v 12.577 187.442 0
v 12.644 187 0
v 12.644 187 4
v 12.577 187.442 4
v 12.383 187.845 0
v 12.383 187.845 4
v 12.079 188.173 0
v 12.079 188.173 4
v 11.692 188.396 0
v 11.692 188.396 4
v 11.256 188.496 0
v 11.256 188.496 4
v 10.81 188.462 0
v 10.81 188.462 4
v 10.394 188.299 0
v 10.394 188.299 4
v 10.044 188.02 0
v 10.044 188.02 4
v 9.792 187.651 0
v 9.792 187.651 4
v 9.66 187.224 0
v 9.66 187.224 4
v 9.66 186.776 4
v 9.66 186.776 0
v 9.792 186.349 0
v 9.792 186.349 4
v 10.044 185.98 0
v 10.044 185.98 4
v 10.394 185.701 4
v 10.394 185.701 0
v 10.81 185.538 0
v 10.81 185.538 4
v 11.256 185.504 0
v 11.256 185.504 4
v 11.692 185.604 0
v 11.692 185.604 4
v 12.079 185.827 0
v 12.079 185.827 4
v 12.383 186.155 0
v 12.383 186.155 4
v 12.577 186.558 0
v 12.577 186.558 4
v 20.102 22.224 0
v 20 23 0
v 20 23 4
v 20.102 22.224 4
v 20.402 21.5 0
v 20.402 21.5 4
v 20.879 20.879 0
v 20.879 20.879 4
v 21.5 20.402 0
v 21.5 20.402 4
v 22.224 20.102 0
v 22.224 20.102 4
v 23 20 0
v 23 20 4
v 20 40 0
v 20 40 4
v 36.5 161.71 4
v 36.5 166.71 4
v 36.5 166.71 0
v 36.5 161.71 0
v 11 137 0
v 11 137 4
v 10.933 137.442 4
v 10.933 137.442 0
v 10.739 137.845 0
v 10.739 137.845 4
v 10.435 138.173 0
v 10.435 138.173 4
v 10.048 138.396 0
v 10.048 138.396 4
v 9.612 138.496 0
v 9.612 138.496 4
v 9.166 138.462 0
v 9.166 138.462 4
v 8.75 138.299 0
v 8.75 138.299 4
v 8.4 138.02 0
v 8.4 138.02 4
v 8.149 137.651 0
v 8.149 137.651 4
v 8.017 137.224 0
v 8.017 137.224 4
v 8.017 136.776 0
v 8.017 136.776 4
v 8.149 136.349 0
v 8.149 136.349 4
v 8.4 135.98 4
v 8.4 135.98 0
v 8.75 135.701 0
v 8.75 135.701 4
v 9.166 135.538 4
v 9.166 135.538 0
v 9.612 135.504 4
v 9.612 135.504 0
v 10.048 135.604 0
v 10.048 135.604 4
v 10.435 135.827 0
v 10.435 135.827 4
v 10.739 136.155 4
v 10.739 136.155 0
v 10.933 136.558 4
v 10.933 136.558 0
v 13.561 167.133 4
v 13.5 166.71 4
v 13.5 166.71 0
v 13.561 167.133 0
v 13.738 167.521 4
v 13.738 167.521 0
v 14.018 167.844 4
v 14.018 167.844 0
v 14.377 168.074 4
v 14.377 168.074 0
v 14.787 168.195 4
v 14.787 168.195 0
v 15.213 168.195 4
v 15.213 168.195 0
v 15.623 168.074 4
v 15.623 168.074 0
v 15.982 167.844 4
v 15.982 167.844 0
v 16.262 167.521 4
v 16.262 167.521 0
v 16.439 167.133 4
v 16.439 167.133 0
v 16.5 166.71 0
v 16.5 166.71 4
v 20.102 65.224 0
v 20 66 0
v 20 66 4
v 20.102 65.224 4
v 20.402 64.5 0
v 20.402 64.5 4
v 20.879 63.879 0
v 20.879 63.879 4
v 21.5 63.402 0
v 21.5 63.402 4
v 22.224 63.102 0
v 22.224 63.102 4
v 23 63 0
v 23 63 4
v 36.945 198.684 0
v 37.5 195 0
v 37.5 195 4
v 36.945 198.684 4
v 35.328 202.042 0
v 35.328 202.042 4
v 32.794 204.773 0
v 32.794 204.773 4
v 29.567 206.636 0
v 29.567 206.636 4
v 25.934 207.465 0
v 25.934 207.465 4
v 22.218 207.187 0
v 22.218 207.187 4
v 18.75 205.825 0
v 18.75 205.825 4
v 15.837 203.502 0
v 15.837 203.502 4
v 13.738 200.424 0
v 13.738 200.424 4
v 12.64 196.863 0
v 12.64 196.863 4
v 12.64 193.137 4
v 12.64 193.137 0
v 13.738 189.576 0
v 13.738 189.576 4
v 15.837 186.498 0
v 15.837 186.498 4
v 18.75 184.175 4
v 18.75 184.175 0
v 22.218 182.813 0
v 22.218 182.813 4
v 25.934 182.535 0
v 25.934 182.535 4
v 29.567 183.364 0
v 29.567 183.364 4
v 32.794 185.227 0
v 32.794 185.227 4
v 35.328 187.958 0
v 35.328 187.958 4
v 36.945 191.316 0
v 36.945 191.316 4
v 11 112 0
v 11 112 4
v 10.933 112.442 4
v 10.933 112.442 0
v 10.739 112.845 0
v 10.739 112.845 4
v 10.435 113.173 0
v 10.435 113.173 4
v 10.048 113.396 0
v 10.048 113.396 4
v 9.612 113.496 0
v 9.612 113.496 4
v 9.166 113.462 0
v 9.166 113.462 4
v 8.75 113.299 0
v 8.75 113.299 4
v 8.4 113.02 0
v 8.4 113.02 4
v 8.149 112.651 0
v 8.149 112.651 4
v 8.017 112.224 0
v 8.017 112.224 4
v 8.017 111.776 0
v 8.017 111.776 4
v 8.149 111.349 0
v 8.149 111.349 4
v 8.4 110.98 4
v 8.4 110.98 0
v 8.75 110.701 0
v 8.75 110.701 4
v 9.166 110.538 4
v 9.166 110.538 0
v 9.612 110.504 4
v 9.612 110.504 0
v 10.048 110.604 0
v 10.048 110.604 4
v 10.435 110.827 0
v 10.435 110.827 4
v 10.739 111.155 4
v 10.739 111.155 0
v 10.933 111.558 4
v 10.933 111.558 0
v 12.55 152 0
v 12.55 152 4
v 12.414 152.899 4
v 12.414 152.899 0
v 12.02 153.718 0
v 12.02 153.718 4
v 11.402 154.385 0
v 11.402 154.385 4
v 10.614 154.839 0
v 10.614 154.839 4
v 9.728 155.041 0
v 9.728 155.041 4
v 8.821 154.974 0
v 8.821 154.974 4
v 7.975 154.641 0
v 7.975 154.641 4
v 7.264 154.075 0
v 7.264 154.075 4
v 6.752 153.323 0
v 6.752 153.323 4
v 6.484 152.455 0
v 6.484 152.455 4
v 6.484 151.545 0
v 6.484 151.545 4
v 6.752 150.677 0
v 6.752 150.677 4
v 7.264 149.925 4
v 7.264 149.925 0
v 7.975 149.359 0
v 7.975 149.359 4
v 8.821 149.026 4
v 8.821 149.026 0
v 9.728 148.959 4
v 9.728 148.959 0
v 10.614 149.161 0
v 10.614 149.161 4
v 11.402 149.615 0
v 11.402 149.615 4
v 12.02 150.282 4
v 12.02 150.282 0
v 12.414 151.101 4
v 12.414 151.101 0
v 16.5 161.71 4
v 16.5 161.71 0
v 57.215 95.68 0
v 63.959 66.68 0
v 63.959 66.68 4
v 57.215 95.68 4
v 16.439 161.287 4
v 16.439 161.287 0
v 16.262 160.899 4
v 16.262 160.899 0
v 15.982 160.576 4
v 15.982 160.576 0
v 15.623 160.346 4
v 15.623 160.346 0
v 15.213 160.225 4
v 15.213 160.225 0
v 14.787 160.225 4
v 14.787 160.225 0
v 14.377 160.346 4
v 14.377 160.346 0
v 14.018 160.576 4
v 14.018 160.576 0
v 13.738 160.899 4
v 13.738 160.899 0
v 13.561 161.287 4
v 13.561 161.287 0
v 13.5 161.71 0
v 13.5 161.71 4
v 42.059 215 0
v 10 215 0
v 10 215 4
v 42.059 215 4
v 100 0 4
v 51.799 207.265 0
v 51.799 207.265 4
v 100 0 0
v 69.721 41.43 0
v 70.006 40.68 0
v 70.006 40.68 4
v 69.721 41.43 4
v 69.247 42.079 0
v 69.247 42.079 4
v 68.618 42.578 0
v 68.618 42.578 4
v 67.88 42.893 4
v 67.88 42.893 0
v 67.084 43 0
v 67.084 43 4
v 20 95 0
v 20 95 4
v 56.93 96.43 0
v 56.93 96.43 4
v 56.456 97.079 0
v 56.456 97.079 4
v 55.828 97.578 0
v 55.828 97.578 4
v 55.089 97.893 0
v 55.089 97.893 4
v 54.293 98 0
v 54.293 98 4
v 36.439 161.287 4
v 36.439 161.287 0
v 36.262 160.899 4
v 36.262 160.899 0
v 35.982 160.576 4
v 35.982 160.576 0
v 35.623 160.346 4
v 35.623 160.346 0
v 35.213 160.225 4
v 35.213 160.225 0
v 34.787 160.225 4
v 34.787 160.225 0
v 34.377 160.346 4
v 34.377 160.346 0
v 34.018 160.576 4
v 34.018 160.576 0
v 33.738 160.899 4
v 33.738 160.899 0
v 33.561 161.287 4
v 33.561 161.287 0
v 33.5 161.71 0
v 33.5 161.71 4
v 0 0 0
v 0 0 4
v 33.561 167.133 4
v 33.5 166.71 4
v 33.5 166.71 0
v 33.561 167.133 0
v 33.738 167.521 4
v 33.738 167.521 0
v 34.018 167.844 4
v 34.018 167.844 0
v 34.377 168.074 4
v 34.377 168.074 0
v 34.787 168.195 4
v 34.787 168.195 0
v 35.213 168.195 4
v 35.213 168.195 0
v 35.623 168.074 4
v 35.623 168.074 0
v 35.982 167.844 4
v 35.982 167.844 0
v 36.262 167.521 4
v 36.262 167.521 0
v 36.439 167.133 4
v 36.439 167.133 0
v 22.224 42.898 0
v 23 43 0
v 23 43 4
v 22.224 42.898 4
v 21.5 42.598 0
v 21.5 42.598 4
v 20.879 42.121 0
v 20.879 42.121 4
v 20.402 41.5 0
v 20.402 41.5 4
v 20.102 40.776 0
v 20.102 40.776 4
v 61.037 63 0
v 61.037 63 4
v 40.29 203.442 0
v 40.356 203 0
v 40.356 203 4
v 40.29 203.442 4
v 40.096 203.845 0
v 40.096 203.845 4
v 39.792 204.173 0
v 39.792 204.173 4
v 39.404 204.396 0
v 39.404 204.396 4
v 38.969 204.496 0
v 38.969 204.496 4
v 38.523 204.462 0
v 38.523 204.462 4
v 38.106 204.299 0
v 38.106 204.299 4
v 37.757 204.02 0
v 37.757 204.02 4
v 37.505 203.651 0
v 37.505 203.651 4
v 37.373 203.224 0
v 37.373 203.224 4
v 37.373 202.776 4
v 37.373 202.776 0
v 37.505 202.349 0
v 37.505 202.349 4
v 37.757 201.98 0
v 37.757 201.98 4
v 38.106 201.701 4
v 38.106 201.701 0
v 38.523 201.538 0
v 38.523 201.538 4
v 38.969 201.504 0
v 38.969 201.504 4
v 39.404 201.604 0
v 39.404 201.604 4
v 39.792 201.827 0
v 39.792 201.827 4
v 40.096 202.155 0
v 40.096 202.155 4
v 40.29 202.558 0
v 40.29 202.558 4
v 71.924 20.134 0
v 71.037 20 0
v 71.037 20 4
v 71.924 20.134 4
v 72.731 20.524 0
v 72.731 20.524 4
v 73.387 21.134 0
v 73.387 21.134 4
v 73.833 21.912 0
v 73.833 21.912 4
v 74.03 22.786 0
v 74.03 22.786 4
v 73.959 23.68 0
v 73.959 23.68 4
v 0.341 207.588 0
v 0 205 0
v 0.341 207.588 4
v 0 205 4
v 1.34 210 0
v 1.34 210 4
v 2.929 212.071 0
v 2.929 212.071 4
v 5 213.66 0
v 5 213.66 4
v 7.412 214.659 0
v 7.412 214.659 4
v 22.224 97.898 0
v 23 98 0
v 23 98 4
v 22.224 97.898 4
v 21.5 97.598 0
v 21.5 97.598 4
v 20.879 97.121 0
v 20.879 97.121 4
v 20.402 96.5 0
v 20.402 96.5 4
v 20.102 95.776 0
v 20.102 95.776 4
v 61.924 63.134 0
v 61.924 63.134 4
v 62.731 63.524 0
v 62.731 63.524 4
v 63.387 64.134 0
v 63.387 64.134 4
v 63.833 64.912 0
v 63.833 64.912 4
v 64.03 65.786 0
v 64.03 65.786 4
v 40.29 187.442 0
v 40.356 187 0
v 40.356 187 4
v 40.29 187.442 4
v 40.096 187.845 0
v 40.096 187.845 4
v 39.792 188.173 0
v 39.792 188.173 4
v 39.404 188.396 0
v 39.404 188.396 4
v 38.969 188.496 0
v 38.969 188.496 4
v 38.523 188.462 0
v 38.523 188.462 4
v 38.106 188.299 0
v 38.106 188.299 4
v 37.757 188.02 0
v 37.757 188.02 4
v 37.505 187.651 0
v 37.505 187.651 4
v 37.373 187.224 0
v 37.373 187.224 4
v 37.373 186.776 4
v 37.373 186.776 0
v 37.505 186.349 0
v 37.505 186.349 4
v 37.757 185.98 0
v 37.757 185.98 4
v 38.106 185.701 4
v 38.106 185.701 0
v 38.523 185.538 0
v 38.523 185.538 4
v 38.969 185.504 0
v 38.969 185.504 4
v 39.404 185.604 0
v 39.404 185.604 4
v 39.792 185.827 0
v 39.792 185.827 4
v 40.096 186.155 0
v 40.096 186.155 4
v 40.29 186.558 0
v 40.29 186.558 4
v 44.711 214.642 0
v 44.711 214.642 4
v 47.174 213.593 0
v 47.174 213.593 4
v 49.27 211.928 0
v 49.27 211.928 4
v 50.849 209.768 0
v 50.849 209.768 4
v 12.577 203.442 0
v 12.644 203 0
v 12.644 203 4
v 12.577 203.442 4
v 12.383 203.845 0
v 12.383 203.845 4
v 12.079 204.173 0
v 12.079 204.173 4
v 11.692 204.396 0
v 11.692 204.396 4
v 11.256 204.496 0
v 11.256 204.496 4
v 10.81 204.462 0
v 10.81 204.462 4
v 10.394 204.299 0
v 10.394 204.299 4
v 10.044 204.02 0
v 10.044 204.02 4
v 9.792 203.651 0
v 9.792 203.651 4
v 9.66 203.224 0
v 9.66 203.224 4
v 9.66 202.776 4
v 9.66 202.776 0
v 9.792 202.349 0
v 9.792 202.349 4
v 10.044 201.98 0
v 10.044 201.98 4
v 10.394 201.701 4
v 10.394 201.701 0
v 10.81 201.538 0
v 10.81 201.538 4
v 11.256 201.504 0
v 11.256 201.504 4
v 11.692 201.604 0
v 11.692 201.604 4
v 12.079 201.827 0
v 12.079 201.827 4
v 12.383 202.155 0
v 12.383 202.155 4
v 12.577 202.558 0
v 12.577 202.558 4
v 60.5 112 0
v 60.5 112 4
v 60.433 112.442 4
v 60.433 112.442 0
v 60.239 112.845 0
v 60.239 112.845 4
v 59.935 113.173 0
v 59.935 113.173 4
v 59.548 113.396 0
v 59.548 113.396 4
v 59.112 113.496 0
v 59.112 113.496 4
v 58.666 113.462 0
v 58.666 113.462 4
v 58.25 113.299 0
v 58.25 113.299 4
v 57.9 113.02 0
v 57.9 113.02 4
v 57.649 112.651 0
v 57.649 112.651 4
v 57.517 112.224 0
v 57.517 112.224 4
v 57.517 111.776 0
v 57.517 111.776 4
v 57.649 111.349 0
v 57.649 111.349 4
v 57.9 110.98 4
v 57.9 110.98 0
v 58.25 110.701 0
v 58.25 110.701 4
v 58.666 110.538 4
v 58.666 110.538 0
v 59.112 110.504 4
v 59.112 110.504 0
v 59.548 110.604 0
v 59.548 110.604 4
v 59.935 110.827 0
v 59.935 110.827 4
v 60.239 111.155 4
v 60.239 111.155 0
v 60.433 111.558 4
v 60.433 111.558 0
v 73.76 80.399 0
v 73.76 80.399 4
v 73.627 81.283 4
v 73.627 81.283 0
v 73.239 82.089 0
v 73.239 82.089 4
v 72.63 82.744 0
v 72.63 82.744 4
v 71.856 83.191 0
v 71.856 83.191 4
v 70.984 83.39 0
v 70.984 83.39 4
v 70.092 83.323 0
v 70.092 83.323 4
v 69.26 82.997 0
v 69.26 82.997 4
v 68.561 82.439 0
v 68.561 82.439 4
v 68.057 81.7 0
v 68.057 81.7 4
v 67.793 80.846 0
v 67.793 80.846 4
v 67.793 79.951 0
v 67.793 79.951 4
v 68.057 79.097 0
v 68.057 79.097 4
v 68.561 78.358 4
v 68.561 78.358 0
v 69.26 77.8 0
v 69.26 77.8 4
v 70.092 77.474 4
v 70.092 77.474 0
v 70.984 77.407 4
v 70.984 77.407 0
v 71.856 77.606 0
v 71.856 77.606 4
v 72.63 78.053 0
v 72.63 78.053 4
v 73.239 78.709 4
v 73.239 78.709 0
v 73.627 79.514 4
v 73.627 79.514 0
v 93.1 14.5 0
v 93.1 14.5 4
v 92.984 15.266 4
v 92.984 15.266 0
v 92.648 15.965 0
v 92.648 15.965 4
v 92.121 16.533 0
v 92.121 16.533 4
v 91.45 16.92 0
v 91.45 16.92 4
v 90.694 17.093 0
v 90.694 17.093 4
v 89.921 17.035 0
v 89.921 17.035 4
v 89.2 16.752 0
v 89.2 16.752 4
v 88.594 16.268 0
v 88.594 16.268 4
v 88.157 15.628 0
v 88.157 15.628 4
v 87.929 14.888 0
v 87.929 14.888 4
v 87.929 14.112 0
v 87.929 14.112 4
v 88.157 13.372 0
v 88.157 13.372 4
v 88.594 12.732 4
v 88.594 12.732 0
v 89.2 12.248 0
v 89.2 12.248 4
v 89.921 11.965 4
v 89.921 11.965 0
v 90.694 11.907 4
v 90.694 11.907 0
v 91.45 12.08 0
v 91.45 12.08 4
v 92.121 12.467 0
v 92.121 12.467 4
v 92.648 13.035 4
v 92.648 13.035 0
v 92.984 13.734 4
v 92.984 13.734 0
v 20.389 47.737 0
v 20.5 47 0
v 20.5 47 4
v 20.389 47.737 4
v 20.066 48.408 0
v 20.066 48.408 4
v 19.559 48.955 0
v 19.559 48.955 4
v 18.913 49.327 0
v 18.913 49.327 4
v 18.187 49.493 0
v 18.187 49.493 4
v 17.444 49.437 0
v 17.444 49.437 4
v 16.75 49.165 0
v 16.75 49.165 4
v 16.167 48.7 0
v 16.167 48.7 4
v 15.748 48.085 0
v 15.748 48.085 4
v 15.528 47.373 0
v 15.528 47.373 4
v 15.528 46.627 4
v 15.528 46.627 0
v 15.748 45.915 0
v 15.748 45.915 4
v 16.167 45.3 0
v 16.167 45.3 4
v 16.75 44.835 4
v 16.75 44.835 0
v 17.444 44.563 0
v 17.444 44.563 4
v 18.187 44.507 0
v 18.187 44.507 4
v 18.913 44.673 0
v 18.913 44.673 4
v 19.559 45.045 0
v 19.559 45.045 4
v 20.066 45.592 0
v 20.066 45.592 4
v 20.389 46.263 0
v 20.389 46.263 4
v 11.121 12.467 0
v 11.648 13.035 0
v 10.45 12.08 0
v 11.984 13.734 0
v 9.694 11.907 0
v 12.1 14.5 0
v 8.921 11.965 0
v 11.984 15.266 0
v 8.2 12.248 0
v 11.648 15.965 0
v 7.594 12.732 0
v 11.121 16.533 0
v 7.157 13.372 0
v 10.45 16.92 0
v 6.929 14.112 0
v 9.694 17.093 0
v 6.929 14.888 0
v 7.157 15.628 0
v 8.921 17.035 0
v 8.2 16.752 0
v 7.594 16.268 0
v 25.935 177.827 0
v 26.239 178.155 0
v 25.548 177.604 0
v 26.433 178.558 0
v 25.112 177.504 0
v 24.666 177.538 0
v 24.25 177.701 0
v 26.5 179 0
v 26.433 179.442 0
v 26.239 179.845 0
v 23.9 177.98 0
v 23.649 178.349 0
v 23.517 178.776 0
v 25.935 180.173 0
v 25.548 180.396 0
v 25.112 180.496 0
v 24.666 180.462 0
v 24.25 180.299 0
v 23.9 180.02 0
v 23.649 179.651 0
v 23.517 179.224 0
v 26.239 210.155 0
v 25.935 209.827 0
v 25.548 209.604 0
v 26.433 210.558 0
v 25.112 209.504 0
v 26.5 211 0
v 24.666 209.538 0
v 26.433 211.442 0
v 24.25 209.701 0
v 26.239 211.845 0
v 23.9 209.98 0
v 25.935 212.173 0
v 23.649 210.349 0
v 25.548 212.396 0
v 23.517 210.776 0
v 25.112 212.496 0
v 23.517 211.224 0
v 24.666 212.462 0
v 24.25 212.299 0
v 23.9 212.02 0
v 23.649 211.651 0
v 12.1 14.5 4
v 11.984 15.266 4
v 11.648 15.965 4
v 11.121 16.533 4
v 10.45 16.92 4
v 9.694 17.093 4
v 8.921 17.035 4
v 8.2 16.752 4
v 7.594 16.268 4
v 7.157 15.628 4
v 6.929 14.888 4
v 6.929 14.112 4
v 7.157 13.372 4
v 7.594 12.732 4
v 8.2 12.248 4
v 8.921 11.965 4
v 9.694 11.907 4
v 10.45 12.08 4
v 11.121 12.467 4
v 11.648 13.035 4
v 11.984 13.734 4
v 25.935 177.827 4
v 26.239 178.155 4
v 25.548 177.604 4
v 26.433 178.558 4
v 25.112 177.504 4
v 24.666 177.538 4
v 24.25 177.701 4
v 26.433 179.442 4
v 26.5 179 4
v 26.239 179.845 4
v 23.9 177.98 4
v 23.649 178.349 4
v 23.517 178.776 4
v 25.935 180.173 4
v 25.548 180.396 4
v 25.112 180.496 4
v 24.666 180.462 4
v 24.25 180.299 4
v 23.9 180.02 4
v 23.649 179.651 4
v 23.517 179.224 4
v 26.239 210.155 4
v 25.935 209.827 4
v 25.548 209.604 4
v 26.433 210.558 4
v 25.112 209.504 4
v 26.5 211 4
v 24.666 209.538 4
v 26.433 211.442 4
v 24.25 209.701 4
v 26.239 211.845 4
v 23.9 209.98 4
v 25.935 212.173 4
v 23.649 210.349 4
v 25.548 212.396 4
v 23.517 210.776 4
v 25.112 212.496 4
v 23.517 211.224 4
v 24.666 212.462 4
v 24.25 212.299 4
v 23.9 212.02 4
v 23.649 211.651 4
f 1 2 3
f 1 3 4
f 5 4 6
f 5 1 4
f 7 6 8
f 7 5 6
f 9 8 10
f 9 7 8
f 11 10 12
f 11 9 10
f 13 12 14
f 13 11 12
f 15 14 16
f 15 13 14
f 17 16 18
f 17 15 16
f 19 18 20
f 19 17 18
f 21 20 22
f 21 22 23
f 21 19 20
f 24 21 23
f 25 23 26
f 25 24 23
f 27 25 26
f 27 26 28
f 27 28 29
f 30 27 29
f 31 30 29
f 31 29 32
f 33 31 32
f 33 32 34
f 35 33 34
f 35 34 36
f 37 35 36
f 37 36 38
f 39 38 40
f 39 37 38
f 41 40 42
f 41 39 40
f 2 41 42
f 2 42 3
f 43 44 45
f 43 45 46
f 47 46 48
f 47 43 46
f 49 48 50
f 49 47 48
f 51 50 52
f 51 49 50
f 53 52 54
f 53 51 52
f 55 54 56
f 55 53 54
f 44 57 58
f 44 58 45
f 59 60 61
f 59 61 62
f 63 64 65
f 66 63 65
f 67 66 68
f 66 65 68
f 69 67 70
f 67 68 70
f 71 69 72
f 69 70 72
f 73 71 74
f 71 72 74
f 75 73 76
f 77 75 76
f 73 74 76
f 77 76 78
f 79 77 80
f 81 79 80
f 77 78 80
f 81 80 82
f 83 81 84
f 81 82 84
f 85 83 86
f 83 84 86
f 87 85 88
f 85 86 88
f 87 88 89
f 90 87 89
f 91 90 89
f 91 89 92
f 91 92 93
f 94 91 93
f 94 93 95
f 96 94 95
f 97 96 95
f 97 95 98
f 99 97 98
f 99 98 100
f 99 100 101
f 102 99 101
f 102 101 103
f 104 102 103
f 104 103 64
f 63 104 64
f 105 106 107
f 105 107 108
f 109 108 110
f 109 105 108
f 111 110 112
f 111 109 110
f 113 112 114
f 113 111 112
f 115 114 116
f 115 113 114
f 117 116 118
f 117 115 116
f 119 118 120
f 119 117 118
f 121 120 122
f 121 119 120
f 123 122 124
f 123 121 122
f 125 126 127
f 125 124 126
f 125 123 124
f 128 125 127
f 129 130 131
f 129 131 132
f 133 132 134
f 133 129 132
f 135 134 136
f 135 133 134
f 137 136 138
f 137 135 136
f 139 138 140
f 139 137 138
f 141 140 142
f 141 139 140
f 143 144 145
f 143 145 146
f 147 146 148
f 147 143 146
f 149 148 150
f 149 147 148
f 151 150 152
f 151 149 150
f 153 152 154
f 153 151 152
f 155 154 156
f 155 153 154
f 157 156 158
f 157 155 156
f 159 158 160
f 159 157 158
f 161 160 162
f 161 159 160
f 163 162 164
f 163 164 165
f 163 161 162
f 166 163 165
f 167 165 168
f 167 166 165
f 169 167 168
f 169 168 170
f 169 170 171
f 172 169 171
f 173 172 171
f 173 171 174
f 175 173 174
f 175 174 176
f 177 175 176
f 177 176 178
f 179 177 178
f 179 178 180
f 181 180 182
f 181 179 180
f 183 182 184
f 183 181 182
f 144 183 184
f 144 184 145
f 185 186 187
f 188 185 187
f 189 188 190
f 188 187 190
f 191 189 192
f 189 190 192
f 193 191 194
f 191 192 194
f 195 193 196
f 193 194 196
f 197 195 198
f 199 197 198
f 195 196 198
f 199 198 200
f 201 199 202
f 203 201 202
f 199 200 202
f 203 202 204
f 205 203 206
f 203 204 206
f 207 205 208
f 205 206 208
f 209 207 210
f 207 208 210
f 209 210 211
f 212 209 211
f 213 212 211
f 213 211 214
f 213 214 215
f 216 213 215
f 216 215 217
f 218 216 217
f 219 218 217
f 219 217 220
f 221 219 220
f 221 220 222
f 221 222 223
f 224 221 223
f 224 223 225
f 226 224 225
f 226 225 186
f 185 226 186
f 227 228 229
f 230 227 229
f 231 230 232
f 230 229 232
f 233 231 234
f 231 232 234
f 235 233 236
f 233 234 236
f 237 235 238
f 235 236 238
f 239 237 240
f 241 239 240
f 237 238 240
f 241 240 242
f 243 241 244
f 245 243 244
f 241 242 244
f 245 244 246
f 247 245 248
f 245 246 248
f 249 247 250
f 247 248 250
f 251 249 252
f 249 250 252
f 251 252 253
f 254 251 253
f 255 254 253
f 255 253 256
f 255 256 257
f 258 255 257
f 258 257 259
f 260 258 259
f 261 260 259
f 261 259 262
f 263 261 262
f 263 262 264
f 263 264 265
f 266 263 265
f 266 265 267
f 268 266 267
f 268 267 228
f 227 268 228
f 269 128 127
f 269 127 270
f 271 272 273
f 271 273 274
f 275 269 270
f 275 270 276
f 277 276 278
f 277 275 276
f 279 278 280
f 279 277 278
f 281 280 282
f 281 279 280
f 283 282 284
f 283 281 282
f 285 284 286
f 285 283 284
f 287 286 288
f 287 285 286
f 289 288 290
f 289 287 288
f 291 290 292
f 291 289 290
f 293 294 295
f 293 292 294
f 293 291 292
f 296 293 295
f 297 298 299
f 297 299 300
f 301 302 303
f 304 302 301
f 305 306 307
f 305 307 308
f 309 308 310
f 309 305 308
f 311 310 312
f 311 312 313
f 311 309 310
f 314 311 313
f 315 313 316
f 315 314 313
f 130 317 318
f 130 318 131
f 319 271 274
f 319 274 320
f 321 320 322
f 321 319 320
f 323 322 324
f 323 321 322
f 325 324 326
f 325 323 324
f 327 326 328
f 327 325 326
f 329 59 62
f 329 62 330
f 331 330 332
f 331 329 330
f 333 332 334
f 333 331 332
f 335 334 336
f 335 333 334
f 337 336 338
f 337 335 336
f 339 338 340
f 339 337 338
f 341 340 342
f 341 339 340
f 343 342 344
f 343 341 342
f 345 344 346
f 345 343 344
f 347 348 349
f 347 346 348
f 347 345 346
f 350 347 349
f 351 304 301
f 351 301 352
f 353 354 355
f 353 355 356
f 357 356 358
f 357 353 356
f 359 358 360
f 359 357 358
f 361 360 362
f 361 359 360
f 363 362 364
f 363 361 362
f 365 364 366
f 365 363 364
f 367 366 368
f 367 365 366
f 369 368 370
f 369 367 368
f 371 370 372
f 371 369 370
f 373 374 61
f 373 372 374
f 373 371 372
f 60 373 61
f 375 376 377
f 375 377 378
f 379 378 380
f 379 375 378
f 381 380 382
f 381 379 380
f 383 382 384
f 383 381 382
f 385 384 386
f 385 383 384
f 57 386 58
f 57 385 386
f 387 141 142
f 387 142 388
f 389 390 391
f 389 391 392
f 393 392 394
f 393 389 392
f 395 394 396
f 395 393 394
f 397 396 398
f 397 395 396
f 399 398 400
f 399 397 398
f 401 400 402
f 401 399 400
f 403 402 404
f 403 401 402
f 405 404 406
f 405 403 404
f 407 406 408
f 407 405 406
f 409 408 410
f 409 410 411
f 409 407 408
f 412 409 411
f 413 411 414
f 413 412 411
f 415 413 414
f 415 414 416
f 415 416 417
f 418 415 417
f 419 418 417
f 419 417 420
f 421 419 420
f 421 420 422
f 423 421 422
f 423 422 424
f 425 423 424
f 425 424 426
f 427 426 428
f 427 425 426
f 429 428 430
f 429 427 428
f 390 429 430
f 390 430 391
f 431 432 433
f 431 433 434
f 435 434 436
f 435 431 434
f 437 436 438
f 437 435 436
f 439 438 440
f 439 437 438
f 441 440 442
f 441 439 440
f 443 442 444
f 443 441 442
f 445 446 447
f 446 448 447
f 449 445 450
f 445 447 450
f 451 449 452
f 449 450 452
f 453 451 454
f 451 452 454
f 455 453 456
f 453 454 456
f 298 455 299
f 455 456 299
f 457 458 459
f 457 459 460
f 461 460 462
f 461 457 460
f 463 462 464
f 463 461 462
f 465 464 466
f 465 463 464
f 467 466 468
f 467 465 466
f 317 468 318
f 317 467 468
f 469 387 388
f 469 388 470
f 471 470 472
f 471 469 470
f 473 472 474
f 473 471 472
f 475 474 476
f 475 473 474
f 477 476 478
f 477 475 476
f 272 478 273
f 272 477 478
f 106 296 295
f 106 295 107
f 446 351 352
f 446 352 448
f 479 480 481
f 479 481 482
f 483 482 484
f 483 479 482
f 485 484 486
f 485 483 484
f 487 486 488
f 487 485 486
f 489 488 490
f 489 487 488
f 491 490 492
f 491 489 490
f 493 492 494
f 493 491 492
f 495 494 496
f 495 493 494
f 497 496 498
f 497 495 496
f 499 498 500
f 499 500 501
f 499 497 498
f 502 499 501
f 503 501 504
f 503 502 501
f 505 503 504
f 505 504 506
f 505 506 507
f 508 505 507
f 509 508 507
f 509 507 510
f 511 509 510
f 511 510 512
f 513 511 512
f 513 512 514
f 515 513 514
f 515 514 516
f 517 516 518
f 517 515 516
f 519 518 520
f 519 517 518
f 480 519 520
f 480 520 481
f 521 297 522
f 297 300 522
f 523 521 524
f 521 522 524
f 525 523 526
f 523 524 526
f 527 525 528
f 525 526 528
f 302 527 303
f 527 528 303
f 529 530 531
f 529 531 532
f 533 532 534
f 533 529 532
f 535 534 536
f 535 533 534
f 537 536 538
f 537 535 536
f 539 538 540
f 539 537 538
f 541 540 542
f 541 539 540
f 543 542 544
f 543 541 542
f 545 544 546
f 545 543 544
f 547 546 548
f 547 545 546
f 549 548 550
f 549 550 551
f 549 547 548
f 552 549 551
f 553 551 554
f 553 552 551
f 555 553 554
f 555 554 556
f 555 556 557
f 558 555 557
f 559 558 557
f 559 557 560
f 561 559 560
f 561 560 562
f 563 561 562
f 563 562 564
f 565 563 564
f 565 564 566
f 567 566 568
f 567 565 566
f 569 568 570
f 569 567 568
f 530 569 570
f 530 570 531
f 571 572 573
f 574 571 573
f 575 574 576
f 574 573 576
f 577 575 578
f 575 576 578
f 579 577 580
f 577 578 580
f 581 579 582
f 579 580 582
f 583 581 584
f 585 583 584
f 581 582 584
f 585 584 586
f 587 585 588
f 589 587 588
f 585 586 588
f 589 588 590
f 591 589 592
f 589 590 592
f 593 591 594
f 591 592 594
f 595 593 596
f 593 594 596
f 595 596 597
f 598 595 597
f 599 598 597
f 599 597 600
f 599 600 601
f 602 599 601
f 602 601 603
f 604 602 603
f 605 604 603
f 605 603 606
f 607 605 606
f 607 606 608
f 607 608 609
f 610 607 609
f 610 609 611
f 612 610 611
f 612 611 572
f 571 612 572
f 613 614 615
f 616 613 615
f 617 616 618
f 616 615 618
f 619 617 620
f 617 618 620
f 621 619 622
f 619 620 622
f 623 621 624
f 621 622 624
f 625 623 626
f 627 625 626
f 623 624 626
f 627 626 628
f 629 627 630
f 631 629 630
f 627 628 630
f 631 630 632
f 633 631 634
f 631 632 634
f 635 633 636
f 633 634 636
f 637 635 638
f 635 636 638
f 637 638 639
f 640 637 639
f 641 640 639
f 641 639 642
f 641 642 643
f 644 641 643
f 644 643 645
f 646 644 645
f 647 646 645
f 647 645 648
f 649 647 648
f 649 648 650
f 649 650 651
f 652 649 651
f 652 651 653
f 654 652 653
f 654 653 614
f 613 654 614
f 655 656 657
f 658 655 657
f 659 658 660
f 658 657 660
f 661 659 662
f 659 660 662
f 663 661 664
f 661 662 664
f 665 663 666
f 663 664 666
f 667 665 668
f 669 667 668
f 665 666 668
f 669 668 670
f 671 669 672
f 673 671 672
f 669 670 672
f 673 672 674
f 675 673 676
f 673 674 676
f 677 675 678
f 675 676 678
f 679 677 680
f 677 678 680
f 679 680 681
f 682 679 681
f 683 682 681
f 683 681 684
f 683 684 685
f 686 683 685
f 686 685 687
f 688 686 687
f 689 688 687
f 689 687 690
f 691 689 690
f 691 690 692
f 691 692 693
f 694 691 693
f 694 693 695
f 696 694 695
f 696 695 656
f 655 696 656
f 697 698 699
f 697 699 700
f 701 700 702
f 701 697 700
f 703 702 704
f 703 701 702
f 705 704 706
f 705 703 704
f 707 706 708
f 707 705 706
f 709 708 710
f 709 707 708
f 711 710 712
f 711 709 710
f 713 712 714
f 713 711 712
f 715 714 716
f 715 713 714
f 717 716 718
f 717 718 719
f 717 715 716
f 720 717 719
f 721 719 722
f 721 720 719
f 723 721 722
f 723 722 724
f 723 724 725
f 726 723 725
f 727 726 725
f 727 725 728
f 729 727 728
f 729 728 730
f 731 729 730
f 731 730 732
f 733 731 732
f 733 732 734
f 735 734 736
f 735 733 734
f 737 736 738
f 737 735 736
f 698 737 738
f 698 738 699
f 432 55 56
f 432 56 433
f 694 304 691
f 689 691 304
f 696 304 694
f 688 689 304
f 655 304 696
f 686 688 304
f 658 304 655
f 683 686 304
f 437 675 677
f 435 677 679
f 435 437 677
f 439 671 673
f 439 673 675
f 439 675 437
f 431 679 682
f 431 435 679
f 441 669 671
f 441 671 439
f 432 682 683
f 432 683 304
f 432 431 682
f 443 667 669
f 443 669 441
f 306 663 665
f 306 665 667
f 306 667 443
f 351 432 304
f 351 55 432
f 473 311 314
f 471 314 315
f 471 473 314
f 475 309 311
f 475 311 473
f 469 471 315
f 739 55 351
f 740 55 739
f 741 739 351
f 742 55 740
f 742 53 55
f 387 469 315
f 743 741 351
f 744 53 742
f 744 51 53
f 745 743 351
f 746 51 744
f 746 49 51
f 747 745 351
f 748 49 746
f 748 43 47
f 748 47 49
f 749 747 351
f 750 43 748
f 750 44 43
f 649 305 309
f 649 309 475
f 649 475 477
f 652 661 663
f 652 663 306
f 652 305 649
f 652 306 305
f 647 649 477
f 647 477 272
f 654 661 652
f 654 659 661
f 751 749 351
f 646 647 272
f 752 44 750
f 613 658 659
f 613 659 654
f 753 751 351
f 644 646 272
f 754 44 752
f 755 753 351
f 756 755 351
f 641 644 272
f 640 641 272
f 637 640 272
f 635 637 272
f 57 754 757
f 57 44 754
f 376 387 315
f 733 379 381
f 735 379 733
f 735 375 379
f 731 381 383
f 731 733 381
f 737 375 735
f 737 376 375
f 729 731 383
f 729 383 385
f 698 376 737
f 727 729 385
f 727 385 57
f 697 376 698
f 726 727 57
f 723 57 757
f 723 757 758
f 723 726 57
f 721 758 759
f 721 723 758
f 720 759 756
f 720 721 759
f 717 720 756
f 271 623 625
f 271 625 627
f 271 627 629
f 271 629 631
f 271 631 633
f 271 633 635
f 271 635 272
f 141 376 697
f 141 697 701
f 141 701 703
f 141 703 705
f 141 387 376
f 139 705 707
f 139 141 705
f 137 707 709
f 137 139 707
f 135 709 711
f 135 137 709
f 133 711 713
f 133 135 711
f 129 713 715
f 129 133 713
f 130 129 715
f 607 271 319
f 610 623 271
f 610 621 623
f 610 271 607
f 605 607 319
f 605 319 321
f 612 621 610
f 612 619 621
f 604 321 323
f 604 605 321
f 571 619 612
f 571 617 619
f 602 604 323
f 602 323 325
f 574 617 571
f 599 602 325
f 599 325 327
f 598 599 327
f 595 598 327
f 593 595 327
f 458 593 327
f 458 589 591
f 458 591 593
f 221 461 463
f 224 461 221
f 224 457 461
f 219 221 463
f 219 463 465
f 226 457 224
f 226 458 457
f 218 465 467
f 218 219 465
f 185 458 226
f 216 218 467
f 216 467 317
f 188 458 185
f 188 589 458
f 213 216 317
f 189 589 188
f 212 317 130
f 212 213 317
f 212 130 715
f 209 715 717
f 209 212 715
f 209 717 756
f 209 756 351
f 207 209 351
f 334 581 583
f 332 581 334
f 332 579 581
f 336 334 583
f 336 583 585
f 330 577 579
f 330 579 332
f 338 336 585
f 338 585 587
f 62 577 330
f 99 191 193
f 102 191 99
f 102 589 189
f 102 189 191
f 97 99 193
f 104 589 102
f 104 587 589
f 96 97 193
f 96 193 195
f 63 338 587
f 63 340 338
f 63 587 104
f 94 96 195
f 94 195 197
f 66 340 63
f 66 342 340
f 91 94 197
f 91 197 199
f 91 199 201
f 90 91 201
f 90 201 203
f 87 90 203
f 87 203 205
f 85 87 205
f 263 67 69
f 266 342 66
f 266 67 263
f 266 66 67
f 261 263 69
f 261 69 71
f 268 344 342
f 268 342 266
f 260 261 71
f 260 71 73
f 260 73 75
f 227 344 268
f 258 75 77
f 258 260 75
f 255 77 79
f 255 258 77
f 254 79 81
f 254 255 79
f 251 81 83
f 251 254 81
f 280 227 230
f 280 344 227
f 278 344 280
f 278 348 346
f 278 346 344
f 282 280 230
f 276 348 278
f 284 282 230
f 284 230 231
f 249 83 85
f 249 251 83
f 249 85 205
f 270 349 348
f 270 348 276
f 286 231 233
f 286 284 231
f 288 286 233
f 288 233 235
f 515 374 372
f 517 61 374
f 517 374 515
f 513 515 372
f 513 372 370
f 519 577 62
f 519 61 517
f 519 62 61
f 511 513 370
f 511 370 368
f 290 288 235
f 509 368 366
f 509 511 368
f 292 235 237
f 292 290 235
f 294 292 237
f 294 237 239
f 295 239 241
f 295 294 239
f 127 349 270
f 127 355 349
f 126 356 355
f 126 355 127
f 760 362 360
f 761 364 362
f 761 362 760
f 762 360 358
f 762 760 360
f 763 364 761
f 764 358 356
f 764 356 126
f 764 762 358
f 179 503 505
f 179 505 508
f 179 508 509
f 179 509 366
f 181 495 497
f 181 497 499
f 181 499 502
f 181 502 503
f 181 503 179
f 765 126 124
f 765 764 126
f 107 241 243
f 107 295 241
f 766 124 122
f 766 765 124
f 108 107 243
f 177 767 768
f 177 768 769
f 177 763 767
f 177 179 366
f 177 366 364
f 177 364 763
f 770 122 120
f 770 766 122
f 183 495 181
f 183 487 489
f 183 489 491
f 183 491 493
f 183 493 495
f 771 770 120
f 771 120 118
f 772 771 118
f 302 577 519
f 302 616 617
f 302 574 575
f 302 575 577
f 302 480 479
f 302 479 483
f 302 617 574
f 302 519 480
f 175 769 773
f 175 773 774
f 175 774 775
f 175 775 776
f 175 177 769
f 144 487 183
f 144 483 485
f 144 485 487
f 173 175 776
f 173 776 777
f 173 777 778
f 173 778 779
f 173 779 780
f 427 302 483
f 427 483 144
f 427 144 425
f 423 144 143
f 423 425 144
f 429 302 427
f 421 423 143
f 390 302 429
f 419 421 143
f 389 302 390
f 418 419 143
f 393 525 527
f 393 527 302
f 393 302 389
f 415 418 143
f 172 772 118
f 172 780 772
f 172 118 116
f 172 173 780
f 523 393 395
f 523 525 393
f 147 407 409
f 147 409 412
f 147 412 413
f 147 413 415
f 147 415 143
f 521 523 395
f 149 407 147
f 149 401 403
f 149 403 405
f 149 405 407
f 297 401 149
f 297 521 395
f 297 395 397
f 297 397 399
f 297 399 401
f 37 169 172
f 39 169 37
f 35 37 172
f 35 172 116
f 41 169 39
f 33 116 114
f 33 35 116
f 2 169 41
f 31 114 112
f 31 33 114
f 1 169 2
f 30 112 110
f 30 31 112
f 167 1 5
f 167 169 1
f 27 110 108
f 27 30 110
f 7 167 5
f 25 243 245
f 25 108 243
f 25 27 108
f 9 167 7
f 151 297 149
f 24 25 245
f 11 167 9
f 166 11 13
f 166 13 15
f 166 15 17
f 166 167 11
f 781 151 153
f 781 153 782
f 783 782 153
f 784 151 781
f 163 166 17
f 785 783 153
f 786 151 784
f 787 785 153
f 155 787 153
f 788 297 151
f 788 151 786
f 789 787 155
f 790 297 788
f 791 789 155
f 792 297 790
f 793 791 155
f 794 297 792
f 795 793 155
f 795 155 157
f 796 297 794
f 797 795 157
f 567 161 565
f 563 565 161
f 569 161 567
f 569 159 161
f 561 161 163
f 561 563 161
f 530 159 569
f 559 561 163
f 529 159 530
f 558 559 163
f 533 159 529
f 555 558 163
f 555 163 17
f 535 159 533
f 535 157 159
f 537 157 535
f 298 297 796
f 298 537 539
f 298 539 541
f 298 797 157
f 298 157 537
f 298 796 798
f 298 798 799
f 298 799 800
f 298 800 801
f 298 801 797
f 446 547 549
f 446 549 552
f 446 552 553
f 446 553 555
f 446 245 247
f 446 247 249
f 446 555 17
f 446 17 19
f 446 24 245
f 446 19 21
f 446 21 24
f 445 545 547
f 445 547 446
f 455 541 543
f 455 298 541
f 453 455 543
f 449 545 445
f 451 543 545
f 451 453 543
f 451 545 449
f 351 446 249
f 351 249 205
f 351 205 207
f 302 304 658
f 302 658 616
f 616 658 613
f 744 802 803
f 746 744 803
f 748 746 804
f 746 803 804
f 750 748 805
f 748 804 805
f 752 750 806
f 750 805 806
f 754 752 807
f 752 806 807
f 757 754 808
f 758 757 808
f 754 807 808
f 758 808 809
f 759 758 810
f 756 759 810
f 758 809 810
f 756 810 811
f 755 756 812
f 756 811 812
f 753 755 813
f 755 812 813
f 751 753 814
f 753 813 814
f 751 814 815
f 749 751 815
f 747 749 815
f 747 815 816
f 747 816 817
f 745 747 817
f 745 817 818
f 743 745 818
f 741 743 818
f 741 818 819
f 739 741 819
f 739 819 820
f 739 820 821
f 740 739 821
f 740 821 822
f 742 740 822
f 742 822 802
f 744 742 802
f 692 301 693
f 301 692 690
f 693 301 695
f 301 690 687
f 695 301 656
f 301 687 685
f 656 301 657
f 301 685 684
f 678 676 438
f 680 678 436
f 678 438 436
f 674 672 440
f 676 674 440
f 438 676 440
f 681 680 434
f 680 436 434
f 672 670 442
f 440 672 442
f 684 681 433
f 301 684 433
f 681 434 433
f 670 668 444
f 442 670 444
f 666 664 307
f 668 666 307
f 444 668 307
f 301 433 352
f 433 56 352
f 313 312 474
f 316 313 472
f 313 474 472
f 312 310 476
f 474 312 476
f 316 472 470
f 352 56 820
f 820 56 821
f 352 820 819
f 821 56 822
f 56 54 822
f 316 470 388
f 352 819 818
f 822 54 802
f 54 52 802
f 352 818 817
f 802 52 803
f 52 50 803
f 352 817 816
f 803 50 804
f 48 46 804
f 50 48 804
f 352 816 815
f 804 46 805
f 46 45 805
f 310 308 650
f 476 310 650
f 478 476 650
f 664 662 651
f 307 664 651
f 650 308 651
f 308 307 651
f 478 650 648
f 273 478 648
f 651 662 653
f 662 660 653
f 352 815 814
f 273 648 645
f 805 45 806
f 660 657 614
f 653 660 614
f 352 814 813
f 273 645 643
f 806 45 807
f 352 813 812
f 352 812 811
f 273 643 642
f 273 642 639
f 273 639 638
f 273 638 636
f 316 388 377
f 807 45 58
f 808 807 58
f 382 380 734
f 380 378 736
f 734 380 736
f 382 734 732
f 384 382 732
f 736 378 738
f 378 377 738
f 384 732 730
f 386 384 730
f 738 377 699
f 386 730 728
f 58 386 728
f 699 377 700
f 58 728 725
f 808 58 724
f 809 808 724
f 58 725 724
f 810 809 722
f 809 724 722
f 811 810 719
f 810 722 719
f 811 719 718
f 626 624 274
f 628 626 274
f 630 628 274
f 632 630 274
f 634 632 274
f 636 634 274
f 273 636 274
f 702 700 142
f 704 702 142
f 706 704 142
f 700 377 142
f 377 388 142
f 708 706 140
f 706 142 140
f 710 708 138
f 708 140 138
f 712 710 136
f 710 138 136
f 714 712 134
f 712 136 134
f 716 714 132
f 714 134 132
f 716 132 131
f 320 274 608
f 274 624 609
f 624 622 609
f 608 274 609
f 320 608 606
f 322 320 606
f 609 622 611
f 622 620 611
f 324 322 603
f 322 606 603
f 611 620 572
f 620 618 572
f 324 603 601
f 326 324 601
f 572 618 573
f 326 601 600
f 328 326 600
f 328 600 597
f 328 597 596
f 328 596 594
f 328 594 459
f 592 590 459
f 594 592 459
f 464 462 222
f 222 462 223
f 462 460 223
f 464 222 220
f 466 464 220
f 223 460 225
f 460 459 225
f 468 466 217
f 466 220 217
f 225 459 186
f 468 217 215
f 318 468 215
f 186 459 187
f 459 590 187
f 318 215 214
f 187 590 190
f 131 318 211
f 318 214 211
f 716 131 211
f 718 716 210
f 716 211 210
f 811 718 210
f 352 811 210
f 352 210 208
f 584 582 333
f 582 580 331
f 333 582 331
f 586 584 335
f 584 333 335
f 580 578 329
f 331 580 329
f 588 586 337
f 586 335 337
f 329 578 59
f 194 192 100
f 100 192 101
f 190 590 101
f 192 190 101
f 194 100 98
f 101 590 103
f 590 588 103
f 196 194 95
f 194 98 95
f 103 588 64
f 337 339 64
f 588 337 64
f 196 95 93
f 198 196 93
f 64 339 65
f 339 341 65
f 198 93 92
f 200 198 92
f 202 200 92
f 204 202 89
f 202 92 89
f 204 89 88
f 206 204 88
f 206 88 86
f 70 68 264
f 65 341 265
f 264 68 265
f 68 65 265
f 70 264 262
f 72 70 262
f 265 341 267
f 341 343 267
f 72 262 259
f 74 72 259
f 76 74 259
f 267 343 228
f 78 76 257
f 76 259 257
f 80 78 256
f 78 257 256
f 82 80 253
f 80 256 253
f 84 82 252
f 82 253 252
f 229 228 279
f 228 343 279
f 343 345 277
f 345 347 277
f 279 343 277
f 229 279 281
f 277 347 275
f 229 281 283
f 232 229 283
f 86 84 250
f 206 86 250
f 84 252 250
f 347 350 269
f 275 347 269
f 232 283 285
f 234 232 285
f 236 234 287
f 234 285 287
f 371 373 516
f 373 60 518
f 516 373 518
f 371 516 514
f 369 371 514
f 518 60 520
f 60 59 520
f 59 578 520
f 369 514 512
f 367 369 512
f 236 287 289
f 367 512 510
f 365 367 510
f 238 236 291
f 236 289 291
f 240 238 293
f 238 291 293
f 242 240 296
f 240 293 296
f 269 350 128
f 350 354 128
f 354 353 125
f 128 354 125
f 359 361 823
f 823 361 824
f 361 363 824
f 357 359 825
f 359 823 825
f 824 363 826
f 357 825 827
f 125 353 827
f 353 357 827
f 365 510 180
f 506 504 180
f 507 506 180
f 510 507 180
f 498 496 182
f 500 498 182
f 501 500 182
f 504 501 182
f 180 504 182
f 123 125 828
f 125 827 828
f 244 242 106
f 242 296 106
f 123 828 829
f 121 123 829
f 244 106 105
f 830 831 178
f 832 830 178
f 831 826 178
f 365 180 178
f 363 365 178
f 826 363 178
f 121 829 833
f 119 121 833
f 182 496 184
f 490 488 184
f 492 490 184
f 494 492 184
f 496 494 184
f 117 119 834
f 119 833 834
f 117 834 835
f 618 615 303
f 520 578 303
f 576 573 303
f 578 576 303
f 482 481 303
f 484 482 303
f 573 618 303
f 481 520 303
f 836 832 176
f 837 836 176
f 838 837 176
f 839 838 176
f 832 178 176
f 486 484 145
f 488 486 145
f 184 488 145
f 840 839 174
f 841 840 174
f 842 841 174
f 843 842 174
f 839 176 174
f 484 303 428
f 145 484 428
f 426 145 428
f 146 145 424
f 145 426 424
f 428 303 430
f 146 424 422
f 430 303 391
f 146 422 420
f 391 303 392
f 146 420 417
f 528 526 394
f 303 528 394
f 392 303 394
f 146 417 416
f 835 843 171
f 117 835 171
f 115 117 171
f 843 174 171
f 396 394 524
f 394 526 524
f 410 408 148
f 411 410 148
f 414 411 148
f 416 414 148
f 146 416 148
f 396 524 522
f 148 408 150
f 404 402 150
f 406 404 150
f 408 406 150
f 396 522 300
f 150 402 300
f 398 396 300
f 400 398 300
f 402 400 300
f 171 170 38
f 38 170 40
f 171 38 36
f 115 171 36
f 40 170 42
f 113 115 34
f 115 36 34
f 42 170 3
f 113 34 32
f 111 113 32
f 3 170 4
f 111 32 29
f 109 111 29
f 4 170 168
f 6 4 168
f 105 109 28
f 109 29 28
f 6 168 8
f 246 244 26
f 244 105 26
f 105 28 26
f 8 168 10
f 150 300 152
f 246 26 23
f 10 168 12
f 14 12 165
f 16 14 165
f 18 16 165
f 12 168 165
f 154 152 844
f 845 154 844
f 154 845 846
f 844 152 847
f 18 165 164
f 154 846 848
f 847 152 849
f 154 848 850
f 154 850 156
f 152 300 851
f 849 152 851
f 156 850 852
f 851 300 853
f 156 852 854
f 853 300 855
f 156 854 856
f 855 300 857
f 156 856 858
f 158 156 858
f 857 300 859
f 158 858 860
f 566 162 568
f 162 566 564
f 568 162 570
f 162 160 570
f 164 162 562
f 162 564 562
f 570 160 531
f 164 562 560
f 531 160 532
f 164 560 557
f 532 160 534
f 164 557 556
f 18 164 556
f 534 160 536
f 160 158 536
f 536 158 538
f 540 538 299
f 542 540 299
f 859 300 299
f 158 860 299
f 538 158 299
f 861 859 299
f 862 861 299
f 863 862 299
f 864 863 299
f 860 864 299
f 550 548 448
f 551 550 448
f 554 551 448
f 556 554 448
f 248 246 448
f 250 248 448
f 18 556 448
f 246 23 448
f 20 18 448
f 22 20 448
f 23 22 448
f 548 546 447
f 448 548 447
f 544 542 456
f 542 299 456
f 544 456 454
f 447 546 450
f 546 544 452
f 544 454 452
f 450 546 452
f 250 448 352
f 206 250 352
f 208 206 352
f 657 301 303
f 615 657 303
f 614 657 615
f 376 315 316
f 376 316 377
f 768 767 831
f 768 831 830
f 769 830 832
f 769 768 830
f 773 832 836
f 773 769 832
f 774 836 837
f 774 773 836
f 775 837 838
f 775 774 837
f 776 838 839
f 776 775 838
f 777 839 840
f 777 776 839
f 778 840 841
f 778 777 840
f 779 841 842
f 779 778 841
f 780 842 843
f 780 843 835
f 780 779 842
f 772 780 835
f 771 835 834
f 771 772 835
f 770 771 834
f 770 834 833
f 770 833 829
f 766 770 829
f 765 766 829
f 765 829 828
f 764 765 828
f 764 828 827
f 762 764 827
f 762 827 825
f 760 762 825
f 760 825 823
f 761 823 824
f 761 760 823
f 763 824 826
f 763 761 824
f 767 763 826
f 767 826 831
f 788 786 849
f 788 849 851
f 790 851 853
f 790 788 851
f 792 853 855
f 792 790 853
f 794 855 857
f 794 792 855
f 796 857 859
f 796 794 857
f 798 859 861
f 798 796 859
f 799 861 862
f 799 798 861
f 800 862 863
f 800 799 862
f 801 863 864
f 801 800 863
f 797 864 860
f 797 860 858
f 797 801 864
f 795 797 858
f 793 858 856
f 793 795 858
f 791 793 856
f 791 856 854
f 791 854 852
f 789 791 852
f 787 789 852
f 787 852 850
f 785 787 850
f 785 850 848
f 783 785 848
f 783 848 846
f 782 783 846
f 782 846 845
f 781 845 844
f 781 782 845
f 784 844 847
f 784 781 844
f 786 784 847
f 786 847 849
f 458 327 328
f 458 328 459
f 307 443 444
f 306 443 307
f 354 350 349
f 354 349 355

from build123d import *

# Parameters (mm, degrees)
ESBO_O1_R                = 12.5
ESBO_O1_R_2              = 1.5
ESBO_O1_R_3              = 2.5
RESSALTO_EXTRUS_O2_DEPTH = 4
FILETE1_R                = 10
ESBO_O2_R                = 1.5
ESBO_O2_R_2              = 2.6
ESBO_O2_R_3              = 3.05
CORTE_EXTRUS_O1_DEPTH    = 5
ESBO_O3_R                = 3
CORTE_EXTRUS_O2_DEPTH    = 5


with BuildPart() as part:
    # Esboço1 → Ressalto-extrusão2 (new body)
    with BuildSketch(Plane.XY):
        Polygon((0, 0), (0, 215), (50, 215), (100, 0), align=None)
        with Locations((25, 195)):
            Circle(ESBO_O1_R, mode=Mode.SUBTRACT)
        with Locations((25, 211)):
            Circle(ESBO_O1_R_2, mode=Mode.SUBTRACT)
        with Locations((38.856406461, 203)):
            Circle(ESBO_O1_R_2, mode=Mode.SUBTRACT)
        with Locations((38.856406461, 187)):
            Circle(ESBO_O1_R_2, mode=Mode.SUBTRACT)
        with Locations((25, 179)):
            Circle(ESBO_O1_R_2, mode=Mode.SUBTRACT)
        with Locations((11.143593539, 187)):
            Circle(ESBO_O1_R_2, mode=Mode.SUBTRACT)
        with Locations((11.143593539, 203)):
            Circle(ESBO_O1_R_2, mode=Mode.SUBTRACT)
        with Locations((18, 47)):
            Circle(ESBO_O1_R_3, mode=Mode.SUBTRACT)
        with BuildLine():
            Line((20, 95), (20, 66))
            ThreePointArc((20, 66), (20.878679656, 63.878679656), (23, 63))
            Line((23, 63), (61.03739436, 63))
            ThreePointArc((61.03739436, 63), (63.386715693, 64.134339454), (63.959418441, 66.679540484))
            Line((63.959418441, 66.679540484), (57.215232395, 95.679540484))
            ThreePointArc((57.215232395, 95.679540484), (56.15886886, 97.349321333), (54.293208314, 98))
            Line((54.293208314, 98), (23, 98))
            ThreePointArc((23, 98), (20.878679656, 97.121320344), (20, 95))
        make_face(mode=Mode.SUBTRACT)
        with BuildLine():
            Line((20, 40), (20, 23))
            ThreePointArc((20, 23), (20.878679656, 20.878679656), (23, 20))
            Line((23, 20), (71.03739436, 20))
            ThreePointArc((71.03739436, 20), (73.386715693, 21.134339454), (73.959418441, 23.679540484))
            Line((73.959418441, 23.679540484), (70.005930069, 40.679540484))
            ThreePointArc((70.005930069, 40.679540484), (68.949566534, 42.349321333), (67.083905988, 43))
            Line((67.083905988, 43), (23, 43))
            ThreePointArc((23, 43), (20.878679656, 42.121320344), (20, 40))
        make_face(mode=Mode.SUBTRACT)
    extrude(amount=RESSALTO_EXTRUS_O2_DEPTH)

    # Filete1
    filete1_edges = [part.edges().sort_by_distance(p)[0] for p in [
        (0, 215, 2),
        (50, 215, 2),
    ]]
    fillet(filete1_edges, radius=FILETE1_R)

    # Esboço2 → Corte-extrusão1 (cut, through all)
    with BuildSketch(Plane.XY.offset(4)):
        with Locations((9.5, 137)):
            Circle(ESBO_O2_R)
        with Locations((90.5, 14.5)):
            Circle(ESBO_O2_R_2)
        with Locations((9.5, 112)):
            Circle(ESBO_O2_R)
        with Locations((9.5, 152)):
            Circle(ESBO_O2_R_3)
        with Locations((59, 112)):
            Circle(ESBO_O2_R)
        with Locations((9.5, 14.5)):
            Circle(ESBO_O2_R_2)
        with BuildLine():
            Line((13.5, 161.71), (13.5, 166.71))
            ThreePointArc((13.5, 166.71), (15, 168.21), (16.5, 166.71))
            Line((16.5, 166.71), (16.5, 161.71))
            ThreePointArc((16.5, 161.71), (15, 160.21), (13.5, 161.71))
        make_face()
        with BuildLine():
            Line((33.5, 161.71), (33.5, 166.71))
            ThreePointArc((33.5, 166.71), (35, 168.21), (36.5, 166.71))
            Line((36.5, 166.71), (36.5, 161.71))
            ThreePointArc((36.5, 161.71), (35, 160.21), (33.5, 161.71))
        make_face()
    extrude(amount=-CORTE_EXTRUS_O1_DEPTH, mode=Mode.SUBTRACT)

    # Esboço3 → Corte-extrusão2 (cut, through all)
    with BuildSketch(Plane.XY.offset(4)):
        with Locations((70.759810426, 80.398555206)):
            Circle(ESBO_O3_R)
    extrude(amount=-CORTE_EXTRUS_O2_DEPTH, mode=Mode.SUBTRACT)


solid = part.part
